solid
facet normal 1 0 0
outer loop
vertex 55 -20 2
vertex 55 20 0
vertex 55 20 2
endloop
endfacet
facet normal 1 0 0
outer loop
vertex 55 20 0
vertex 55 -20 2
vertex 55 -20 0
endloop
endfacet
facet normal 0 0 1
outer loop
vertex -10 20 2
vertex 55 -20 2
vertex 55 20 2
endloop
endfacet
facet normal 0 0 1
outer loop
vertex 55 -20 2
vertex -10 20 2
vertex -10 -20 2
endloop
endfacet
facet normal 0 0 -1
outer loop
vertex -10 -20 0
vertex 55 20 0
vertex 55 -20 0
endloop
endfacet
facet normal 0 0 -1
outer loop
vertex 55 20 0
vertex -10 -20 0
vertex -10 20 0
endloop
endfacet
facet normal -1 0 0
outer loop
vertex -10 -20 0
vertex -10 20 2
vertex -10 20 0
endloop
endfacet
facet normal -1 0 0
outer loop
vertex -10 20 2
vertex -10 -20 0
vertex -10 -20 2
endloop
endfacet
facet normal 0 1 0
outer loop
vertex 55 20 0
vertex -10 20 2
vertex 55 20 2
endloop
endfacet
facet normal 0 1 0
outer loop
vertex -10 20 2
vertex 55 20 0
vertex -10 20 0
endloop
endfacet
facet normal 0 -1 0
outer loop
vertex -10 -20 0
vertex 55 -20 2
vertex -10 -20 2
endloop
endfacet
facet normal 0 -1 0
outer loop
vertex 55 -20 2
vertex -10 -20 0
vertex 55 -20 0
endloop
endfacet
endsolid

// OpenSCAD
union() {
    linear_extrude(height=20) 
    {
        translate([0,0,0]) square([10,5]);
        translate([0,0,0]) rotate(90) square([15,5]);
        translate([45,15,0]) rotate(90) square([5,50]);
        translate([45,0,0]) square([5,20]);
        translate([35, 0,0]) square([10,5]);
    }
    translate([-10,-20,0]) cube([65,40,2]);
    #cylinder(size=20, height=20);
}
